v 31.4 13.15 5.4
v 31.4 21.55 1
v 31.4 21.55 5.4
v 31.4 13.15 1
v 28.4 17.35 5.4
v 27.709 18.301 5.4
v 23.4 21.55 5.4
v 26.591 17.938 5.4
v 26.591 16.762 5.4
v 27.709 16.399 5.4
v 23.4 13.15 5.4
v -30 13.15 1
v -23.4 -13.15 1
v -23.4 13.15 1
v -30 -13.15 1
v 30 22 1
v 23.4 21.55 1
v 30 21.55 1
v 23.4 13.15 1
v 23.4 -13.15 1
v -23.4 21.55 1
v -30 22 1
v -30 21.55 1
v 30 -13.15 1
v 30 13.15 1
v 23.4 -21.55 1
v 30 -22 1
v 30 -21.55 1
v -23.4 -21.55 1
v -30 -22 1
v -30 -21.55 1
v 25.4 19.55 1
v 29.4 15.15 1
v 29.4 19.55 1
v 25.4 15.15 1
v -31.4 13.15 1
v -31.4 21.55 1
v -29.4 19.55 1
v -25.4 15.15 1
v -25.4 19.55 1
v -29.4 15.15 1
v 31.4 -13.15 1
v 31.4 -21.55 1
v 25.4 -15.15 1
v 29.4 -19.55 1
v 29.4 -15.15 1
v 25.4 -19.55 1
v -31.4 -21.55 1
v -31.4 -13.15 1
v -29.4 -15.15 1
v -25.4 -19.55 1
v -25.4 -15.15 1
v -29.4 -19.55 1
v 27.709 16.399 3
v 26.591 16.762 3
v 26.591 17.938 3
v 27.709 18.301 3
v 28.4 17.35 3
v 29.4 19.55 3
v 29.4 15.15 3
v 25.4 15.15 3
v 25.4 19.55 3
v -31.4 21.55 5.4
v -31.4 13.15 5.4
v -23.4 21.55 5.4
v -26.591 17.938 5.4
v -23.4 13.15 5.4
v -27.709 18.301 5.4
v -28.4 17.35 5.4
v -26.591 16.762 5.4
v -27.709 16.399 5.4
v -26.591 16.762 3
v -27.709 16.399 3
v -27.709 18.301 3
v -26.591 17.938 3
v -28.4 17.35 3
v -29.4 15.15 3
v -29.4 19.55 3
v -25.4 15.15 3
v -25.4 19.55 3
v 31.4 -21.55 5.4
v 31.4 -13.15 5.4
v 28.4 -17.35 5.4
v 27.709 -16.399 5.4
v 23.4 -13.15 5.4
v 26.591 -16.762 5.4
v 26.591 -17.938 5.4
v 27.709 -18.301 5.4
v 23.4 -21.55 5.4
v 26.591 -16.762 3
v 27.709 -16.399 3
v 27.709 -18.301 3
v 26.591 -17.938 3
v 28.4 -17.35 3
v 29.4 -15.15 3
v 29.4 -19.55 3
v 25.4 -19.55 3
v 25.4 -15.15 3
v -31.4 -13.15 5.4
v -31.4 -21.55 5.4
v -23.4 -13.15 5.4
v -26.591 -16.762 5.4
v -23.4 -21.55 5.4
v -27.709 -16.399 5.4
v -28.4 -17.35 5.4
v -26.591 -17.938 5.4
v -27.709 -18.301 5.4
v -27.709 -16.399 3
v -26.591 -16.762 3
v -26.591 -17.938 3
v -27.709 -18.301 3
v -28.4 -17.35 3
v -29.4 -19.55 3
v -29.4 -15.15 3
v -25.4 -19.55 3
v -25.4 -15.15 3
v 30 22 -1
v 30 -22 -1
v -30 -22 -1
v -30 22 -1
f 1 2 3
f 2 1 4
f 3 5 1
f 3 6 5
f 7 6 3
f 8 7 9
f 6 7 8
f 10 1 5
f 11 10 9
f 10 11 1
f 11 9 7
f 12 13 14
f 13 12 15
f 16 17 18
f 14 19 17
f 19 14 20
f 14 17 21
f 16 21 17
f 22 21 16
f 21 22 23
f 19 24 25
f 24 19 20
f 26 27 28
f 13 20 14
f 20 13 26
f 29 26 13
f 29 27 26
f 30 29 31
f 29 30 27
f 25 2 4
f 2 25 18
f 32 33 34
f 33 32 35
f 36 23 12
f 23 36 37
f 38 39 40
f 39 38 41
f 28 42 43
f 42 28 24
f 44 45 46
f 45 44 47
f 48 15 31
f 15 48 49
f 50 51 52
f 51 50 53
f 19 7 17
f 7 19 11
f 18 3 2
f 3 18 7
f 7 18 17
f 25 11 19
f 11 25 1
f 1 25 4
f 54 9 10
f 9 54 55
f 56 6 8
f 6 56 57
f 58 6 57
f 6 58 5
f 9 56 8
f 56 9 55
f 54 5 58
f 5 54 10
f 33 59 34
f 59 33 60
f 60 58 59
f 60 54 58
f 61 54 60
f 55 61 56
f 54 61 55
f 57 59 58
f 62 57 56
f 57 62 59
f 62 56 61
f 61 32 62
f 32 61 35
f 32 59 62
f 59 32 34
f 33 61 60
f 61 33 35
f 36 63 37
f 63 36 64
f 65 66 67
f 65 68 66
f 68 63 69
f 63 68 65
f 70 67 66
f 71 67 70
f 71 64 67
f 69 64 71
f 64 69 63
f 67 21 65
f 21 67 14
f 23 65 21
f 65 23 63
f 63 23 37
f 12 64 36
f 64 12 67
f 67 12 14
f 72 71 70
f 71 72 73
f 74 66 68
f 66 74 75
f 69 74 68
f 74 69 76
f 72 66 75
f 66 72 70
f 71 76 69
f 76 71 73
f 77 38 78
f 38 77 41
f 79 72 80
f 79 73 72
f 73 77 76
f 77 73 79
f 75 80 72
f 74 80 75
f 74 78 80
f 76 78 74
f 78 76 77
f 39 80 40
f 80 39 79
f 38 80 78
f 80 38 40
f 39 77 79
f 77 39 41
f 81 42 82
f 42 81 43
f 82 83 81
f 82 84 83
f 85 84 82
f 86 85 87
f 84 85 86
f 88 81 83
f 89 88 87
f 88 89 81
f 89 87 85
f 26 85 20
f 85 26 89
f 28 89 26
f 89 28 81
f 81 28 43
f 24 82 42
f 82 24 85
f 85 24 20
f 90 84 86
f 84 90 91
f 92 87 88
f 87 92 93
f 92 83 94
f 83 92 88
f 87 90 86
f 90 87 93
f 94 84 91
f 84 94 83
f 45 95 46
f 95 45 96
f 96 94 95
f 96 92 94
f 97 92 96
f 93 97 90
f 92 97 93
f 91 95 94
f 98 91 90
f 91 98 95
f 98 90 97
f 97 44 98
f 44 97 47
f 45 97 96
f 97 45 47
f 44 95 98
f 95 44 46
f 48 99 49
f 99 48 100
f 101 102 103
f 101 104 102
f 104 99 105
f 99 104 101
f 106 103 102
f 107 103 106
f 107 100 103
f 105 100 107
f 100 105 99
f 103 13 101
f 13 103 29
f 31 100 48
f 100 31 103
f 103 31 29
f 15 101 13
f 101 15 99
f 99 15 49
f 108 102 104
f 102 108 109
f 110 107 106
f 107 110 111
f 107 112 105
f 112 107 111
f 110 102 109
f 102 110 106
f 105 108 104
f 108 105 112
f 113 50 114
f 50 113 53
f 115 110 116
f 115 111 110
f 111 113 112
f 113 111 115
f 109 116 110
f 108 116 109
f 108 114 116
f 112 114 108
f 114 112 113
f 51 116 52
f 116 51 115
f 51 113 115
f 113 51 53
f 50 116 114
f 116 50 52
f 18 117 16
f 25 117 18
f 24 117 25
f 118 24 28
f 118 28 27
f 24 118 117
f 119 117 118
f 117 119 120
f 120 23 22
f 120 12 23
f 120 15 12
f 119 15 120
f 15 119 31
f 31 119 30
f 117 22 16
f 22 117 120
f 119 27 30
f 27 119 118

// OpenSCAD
PCB_WIDTH = 58.8;
PCB_HEIGHT = 39.1;
PGB_THICKNESS = 1.6;
PCB_STANDOFF = 2.4;

BOX_WIDTH = 60;
BOX_HEIGHT = 44;
BOX_BASE_DEPTH = 2;

NUT_TRAP_WIDTH = 4;
NUT_TRAP_HEIGHT = 4.4;
NUT_TRAP_DEPTH = 2;



// PCB for reference
%translate([0, 0, BOX_BASE_DEPTH/2 + NUT_TRAP_DEPTH + PCB_STANDOFF + PGB_THICKNESS/2]) {
    cube([PCB_WIDTH, PCB_HEIGHT, PGB_THICKNESS], center = true);
}


module nut_trap() {
    translate([
        PCB_WIDTH/2 - NUT_TRAP_WIDTH,
        PCB_HEIGHT/2 - NUT_TRAP_HEIGHT,
        BOX_BASE_DEPTH/2
    ]) {

        difference() {
            translate([-2, -2, 0]) {
                cube([NUT_TRAP_WIDTH + 4, NUT_TRAP_HEIGHT + 4, NUT_TRAP_DEPTH + PCB_STANDOFF], center = false);
            }
            // Hole for bolt
            translate([NUT_TRAP_WIDTH/2, NUT_TRAP_HEIGHT/2, 0]) {
                cylinder(h = NUT_TRAP_DEPTH + PCB_STANDOFF + 1, r = 1, center = false);
            }
            // nut trap box cut out
            cube([NUT_TRAP_WIDTH, NUT_TRAP_HEIGHT, NUT_TRAP_DEPTH], center = false);
        }
    };
}

// Base
cube([BOX_WIDTH, BOX_HEIGHT, BOX_BASE_DEPTH], center = true);

corners() {
    nut_trap();
}

module corners() {
    children();
    mirror([1, 0, 0]) {
        children();
    }
    mirror([0, 1, 0]) {
        children();
        mirror([1, 0, 0]) {
            children();
        }
    }
}
